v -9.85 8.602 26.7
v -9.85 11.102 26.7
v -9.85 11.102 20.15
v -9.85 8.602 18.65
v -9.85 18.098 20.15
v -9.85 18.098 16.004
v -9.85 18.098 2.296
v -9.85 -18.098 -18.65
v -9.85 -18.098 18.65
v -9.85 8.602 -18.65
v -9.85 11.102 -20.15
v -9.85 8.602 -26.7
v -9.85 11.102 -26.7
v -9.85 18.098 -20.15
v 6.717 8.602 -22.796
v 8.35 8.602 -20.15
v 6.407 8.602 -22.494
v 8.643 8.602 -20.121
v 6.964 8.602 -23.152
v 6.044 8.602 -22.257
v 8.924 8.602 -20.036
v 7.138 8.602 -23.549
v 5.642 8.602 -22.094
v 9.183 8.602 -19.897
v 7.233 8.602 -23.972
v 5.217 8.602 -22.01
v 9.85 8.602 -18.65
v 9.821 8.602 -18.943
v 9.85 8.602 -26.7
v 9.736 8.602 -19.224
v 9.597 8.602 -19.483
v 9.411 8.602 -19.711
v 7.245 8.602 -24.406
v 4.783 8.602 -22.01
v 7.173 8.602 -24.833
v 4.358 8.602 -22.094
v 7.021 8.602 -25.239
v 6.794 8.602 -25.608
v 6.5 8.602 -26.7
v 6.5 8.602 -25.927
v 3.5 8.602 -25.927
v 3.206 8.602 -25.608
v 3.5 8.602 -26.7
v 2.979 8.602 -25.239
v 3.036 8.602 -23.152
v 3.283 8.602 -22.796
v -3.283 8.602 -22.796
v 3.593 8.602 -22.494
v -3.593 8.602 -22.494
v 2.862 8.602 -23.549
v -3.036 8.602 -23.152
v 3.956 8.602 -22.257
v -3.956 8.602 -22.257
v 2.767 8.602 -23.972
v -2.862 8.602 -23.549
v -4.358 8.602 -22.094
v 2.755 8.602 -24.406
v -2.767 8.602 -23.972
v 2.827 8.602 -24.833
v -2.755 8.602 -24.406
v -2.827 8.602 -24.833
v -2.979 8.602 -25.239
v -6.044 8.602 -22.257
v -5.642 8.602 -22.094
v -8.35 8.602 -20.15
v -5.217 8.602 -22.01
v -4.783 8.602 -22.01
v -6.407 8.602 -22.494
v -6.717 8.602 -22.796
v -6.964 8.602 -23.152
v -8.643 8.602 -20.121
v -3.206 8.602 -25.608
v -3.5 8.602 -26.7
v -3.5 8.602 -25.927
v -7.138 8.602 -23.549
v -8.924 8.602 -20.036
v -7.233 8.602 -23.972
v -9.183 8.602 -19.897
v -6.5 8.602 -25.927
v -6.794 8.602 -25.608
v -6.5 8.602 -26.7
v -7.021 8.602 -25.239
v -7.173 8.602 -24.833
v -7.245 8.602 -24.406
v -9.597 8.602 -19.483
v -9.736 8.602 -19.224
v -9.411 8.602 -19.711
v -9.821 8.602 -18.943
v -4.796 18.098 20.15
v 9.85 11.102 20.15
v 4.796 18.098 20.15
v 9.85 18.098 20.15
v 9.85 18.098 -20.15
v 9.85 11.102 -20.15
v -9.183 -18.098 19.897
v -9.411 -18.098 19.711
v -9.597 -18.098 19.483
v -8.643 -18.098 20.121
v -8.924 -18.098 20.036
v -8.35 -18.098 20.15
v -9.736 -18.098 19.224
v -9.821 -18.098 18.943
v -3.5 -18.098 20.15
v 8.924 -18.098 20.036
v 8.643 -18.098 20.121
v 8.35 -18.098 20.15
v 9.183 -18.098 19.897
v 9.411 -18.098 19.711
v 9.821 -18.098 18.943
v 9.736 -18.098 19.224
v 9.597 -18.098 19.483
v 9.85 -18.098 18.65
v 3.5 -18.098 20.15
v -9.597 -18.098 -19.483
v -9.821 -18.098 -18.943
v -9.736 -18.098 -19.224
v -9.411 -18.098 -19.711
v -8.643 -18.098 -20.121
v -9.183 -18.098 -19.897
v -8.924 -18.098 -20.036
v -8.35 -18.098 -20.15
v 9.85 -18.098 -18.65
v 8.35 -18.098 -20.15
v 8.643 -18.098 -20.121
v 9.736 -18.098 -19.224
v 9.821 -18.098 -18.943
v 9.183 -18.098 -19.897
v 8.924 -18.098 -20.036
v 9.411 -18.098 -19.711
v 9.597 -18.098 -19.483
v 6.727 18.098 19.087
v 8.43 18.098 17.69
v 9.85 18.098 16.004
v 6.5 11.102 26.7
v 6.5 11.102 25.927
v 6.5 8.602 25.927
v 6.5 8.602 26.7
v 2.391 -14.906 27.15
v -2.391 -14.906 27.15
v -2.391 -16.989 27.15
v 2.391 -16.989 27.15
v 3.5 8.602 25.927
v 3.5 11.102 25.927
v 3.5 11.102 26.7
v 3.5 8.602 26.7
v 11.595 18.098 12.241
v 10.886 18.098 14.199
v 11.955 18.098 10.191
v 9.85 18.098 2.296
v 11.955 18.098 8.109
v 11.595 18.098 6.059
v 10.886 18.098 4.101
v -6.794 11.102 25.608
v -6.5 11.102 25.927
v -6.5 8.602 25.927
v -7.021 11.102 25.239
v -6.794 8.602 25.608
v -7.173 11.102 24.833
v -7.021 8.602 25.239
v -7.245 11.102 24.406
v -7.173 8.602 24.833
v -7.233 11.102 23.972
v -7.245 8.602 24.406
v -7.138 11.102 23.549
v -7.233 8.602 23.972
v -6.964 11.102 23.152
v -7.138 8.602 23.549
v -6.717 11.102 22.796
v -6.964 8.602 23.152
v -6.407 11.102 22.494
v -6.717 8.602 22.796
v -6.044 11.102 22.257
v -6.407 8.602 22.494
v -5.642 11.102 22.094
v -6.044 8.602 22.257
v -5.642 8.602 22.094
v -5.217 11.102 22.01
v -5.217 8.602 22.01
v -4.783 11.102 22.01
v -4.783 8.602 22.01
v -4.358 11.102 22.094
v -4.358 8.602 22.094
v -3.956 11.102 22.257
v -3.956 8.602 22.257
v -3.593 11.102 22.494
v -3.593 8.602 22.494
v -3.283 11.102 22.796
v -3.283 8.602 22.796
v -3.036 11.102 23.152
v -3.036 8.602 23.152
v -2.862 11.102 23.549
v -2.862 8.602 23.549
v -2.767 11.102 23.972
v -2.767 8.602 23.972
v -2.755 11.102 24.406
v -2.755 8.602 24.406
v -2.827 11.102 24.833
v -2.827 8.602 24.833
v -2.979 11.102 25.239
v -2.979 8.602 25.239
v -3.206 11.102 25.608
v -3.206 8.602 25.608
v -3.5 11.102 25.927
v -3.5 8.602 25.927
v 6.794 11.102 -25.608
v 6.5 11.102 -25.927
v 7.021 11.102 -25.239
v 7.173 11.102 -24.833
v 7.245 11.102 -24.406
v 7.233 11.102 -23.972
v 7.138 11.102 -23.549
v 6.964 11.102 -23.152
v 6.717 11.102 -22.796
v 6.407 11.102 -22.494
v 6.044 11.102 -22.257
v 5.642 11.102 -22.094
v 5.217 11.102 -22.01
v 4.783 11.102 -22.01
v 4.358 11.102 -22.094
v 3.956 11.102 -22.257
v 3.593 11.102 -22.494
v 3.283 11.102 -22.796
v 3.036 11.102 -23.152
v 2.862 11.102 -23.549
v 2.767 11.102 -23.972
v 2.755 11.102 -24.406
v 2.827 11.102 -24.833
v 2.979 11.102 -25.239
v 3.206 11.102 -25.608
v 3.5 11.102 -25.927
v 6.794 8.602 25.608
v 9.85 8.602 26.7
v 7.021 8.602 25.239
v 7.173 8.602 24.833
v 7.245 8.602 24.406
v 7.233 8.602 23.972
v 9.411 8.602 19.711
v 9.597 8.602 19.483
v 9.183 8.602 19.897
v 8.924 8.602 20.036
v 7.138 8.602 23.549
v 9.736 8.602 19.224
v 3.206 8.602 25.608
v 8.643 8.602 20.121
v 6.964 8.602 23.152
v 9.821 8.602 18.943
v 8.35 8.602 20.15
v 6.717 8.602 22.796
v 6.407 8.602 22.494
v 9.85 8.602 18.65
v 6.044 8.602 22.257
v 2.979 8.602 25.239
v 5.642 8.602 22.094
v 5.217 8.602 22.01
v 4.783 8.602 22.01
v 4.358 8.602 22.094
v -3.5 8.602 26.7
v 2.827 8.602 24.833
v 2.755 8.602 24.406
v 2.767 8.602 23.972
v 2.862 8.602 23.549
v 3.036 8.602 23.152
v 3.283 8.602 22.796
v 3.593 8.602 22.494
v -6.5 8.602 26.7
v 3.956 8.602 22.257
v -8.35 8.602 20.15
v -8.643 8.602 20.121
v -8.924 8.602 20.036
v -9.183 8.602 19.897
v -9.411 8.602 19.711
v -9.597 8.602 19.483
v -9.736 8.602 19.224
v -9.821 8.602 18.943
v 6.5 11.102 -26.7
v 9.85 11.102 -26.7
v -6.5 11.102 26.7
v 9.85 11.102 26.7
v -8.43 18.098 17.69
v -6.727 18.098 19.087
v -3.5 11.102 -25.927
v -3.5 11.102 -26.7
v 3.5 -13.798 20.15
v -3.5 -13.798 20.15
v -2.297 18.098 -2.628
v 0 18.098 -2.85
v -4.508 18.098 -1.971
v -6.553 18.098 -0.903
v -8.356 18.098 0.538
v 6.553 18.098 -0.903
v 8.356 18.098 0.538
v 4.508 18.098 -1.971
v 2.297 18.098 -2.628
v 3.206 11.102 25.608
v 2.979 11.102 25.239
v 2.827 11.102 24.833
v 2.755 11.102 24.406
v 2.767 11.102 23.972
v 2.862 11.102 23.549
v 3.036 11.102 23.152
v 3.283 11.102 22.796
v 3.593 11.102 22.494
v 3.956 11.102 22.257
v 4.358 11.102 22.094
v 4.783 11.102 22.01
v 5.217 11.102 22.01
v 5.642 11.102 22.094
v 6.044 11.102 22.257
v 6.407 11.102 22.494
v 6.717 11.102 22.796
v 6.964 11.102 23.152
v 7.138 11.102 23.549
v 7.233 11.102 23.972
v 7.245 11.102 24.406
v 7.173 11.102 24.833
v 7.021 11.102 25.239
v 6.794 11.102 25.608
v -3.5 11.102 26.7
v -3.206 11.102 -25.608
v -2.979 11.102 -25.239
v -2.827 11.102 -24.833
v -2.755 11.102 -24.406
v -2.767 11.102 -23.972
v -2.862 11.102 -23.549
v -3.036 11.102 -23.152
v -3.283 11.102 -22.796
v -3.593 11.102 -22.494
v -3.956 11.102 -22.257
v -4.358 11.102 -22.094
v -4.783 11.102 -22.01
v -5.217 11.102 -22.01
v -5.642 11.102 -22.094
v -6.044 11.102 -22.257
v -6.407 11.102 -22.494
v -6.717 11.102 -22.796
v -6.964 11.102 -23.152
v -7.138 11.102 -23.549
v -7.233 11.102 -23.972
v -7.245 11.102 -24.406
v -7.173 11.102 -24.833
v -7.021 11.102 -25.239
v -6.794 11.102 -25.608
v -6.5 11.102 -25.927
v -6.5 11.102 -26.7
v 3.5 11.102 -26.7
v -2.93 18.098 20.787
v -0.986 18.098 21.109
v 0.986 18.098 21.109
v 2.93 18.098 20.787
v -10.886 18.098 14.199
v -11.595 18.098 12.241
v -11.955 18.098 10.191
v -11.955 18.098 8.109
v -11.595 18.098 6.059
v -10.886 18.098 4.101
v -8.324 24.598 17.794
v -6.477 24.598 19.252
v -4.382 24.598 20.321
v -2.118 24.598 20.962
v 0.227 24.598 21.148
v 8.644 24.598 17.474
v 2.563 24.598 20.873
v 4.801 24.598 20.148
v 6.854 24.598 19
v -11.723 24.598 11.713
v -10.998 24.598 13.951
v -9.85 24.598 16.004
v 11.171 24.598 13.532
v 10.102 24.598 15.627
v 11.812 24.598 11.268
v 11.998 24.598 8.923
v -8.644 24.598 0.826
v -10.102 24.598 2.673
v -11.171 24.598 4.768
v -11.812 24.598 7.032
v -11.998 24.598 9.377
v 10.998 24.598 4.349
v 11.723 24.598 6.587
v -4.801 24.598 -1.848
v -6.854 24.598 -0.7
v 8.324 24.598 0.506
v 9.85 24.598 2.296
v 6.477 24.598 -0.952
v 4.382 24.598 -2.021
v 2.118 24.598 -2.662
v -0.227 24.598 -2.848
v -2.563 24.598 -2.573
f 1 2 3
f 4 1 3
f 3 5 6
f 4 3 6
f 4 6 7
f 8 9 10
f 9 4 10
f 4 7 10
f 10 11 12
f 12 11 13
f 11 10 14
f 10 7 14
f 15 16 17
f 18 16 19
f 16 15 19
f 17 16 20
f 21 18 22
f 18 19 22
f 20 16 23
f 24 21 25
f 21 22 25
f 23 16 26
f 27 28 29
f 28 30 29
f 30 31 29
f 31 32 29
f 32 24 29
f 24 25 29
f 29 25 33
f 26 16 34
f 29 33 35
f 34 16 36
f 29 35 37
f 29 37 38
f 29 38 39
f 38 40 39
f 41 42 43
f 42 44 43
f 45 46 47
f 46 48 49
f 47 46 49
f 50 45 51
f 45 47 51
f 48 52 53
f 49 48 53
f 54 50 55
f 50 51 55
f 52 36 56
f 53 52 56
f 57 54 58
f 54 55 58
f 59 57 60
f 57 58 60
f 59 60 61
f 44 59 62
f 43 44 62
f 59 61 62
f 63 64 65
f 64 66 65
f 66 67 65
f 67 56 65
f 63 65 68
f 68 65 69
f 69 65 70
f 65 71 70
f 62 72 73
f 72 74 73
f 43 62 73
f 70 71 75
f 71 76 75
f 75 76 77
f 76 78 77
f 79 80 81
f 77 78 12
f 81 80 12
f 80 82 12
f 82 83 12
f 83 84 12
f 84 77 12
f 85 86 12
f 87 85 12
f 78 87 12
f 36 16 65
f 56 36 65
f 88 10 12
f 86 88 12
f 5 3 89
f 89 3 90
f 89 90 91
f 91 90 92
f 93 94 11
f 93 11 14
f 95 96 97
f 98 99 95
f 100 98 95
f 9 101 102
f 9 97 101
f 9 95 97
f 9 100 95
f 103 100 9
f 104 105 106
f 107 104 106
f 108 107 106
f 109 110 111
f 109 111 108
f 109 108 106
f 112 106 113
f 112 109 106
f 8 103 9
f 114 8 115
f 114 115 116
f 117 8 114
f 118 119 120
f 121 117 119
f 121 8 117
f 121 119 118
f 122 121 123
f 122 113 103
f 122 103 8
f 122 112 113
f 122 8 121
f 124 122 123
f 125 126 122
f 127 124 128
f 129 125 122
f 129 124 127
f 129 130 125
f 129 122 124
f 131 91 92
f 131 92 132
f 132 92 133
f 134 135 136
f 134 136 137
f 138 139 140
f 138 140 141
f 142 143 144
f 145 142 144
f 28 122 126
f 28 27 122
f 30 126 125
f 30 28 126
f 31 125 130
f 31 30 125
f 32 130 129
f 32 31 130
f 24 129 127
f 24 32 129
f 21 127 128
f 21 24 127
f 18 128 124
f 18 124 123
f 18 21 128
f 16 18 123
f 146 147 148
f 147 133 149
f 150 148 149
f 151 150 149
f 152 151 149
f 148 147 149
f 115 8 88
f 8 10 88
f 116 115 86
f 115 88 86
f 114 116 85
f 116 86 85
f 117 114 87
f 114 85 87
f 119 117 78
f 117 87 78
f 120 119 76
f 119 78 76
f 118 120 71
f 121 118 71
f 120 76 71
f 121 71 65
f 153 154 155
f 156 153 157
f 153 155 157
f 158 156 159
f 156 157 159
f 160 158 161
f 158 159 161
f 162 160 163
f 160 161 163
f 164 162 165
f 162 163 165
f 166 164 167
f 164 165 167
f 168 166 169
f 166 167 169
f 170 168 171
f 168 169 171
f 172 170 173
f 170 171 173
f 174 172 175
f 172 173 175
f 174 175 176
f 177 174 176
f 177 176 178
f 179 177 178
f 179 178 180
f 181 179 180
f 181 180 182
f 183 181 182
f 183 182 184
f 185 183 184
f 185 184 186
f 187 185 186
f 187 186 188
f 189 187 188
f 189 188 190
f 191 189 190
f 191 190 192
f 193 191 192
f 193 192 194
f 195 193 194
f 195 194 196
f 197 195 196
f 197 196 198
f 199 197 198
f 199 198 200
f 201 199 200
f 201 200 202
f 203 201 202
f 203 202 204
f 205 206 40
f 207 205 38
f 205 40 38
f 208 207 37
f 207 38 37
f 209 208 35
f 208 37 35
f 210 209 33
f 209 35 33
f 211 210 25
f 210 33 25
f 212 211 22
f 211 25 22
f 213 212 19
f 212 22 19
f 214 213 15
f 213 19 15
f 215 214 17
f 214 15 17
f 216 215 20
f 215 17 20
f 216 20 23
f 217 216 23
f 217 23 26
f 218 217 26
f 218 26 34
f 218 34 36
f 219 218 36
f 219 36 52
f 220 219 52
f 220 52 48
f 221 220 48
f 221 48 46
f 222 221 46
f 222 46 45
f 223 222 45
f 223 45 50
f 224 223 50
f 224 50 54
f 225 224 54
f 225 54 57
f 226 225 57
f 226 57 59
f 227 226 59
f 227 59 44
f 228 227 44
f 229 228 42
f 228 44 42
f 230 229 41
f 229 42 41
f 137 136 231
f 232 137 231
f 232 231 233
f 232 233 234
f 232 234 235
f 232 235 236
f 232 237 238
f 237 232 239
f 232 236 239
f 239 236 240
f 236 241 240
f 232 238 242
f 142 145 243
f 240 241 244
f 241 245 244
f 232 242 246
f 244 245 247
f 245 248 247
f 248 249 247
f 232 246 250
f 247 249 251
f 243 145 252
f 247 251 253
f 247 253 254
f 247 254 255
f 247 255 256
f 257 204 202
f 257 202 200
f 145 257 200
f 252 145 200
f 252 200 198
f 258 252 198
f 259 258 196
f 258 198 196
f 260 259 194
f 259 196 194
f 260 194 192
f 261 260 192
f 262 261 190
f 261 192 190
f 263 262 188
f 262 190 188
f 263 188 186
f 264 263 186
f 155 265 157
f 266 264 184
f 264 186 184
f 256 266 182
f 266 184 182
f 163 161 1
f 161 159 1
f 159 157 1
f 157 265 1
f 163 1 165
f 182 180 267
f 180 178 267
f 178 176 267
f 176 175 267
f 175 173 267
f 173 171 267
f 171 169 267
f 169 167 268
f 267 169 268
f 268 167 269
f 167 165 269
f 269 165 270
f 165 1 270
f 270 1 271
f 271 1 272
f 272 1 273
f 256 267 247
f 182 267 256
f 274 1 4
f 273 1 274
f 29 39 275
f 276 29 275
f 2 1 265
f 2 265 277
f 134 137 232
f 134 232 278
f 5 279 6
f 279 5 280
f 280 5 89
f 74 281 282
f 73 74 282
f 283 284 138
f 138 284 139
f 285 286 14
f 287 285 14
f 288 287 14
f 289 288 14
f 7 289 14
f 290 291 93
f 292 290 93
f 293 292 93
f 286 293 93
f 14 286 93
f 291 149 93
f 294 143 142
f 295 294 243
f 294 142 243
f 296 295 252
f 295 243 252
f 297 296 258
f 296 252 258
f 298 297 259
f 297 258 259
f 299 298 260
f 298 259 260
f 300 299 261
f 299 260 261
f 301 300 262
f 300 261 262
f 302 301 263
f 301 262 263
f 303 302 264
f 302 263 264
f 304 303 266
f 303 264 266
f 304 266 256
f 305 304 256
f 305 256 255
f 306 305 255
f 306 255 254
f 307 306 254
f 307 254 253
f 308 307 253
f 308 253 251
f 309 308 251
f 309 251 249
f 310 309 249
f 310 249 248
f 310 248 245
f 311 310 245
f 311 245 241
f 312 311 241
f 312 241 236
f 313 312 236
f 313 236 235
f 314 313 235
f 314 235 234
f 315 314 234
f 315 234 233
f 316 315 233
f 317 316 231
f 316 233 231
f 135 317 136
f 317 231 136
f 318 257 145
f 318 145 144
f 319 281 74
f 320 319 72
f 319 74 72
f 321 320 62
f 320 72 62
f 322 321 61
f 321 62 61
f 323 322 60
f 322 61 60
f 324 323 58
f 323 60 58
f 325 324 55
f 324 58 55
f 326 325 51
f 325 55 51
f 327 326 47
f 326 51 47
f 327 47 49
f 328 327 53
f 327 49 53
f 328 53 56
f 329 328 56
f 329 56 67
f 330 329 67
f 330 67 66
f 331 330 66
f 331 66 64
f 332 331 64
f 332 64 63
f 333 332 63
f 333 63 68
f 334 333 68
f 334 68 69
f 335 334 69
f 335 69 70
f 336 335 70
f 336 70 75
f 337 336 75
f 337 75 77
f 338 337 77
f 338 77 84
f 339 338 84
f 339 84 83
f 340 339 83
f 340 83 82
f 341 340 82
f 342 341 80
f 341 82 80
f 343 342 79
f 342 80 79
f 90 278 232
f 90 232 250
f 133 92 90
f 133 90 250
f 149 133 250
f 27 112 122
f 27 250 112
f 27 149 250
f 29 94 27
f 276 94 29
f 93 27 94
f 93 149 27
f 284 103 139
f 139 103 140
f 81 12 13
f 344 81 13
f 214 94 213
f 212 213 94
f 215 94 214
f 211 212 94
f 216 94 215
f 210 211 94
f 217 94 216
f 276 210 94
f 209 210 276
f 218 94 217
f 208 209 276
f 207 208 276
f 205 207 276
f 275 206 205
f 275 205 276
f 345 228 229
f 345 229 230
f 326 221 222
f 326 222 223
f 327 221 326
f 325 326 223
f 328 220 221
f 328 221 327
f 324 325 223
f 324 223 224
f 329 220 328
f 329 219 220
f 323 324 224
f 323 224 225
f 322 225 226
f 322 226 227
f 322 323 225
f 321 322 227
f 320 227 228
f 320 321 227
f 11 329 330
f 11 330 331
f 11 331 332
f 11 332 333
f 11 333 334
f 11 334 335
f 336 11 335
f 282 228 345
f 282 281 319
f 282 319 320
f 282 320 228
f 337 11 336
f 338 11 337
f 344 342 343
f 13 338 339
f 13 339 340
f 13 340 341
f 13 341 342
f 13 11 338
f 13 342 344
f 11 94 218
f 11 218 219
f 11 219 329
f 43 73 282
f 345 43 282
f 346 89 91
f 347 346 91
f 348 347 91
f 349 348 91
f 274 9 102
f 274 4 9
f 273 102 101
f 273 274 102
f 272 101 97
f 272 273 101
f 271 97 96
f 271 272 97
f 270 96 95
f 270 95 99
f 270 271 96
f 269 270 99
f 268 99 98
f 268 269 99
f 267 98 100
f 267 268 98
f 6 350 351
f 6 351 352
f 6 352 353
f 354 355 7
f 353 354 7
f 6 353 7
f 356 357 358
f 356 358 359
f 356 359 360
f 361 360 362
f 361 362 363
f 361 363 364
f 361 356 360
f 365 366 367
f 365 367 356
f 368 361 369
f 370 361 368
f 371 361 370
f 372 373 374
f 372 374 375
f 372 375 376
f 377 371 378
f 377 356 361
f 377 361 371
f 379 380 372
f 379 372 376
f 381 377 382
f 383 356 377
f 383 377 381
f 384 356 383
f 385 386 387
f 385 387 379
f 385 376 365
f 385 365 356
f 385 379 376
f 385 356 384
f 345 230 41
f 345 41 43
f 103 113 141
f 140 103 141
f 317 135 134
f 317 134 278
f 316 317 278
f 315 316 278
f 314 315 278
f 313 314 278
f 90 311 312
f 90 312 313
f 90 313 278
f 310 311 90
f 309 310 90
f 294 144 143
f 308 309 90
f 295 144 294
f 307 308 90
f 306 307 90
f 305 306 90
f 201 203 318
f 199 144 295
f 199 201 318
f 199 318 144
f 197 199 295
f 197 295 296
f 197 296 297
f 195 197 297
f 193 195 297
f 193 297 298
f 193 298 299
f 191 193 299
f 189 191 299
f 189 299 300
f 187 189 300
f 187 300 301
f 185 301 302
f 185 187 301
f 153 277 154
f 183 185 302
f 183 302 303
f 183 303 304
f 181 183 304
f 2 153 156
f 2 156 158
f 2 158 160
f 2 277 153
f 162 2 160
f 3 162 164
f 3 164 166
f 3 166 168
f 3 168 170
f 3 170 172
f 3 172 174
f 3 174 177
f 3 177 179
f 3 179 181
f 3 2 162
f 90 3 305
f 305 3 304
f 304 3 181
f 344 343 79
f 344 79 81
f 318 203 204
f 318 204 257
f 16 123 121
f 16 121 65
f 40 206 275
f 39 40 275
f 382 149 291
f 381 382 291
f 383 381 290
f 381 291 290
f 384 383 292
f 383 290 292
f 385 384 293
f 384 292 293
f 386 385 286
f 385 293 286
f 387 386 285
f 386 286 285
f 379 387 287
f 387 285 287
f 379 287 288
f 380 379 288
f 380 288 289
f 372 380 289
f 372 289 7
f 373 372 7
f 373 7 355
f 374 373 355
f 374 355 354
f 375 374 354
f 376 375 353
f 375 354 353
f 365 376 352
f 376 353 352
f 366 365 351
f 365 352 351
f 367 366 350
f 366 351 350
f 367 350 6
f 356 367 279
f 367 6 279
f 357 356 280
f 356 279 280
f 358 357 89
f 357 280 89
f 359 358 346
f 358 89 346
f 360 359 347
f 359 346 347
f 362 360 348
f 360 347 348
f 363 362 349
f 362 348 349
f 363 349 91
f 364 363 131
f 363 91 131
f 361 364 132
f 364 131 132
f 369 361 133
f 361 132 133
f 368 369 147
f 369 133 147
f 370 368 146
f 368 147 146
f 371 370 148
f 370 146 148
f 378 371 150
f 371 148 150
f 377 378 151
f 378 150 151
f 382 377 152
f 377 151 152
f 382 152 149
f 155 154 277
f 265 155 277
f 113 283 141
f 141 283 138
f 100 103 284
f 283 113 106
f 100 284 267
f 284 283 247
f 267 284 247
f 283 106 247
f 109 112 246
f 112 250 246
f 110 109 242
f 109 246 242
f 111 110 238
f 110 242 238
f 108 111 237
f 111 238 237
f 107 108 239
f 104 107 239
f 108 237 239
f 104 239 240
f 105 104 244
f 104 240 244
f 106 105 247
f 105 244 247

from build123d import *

# Parameters (mm, degrees)
ESQUISSE1_W                         = 40.3
ESQUISSE1_H                         = 36.195
BOSS_EXTRU_1_DEPTH                  = 9.85
ESQUISSE2_W                         = 53.4
ESQUISSE2_H                         = 2.5
BOSS_EXTRU_2_DEPTH                  = 19.7
ESQUISSE3_R                         = 12
BOSS_EXTRU_3_DEPTH                  = 6.5
ESQUISSE5_W                         = 7
ESQUISSE5_H                         = 4.3
BOSS_EXTRU_4_DEPTH                  = 7
BOSS_EXTRU_4_TAPER                  = 9
DIAM_TRE_DU_PER_AGE_4_5_4_5_1_D     = 4.5
DIAM_TRE_DU_PER_AGE_4_5_4_5_1_DEPTH = 3.2
DIAM_TRE_DU_PER_AGE_4_5_4_5_1_TIP   = 1.351936393
ESQUISSE9_W                         = 3
ESQUISSE9_H                         = 0.772949017
ENL_V_MAT_EXTRU_1_DEPTH             = 42.638473795
SYM_TRIE2_COPY_1_SKETCH_W           = 3
SYM_TRIE2_COPY_1_SKETCH_H           = 0.772949017
SYM_TRIE2_COPY_1_DEPTH              = 42.638473795
CONG_1_R                            = 1.5


with BuildPart() as part:
    # Esquisse1 → Boss.-Extru.1 (new, symmetric)
    with BuildSketch(Plane(origin=(0, 0, 0), x_dir=(0, 0, -1), z_dir=(1, 0, 0))):
        Rectangle(ESQUISSE1_W, ESQUISSE1_H)
    extrude(amount=BOSS_EXTRU_1_DEPTH, both=True)

    # Esquisse2 → Boss.-Extru.2 (add)
    with BuildSketch(Plane(origin=(-9.85, 0, 0), x_dir=(0, 0, -1), z_dir=(1, 0, 0))):
        with Locations((0, 9.8525)):
            Rectangle(ESQUISSE2_W, ESQUISSE2_H)
    extrude(amount=BOSS_EXTRU_2_DEPTH)

    # Esquisse3 → Boss.-Extru.3 (add)
    with BuildSketch(Plane(origin=(0, 18.0975, 0), x_dir=(1, 0, 0), z_dir=(0, 1, 0))):
        with Locations(Location((0, -9.15, 0), (0, 0, 34.831699177))):
            Circle(ESQUISSE3_R)
    extrude(amount=BOSS_EXTRU_3_DEPTH)

    # Esquisse5 → Boss.-Extru.4 (add)
    with BuildSketch(Plane.XY.offset(20.15)):
        with Locations((0, -15.9475)):
            Rectangle(ESQUISSE5_W, ESQUISSE5_H)
    extrude(amount=BOSS_EXTRU_4_DEPTH, taper=BOSS_EXTRU_4_TAPER)

    # Diamètre du perçage Ø4.5 (4.5)1
    with Locations(Plane(origin=(0, 11.1025, 0), x_dir=(1, 0, 0), z_dir=(0, 1, 0))):
        with Locations((5, 24.25), (-5, 24.25), (5, -24.25), (-5, -24.25)):
            Hole(DIAM_TRE_DU_PER_AGE_4_5_4_5_1_D / 2, depth=DIAM_TRE_DU_PER_AGE_4_5_4_5_1_DEPTH)
            with Locations((0, 0, -(DIAM_TRE_DU_PER_AGE_4_5_4_5_1_DEPTH + DIAM_TRE_DU_PER_AGE_4_5_4_5_1_TIP / 2))):  # 118° drill point
                Cone(0, DIAM_TRE_DU_PER_AGE_4_5_4_5_1_D / 2, DIAM_TRE_DU_PER_AGE_4_5_4_5_1_TIP, mode=Mode.SUBTRACT)

    # Esquisse9 → Enlèv. mat.-Extru.1 (cut, through all)
    with BuildSketch(Plane(origin=(0, 11.1025, 0), x_dir=(1, 0, 0), z_dir=(0, 1, 0))):
        with Locations((-5, 26.313525492)):
            Rectangle(ESQUISSE9_W, ESQUISSE9_H)
    enl_v_mat_extru_1 = extrude(amount=-ENL_V_MAT_EXTRU_1_DEPTH, mode=Mode.SUBTRACT)

    # Symétrie1: Enlèv. mat.-Extru.1 across plane
    add(enl_v_mat_extru_1.mirror(Plane(origin=(0, 0, 0), x_dir=(0, 0, 1), z_dir=(1, 0, 0))), mode=Mode.SUBTRACT)

    # Symétrie2: Enlèv. mat.-Extru.1 across plane
    add(enl_v_mat_extru_1.mirror(Plane.XY), mode=Mode.SUBTRACT)

    # Symétrie2 copy 1 sketch → Symétrie2 copy 1 (cut, through all)
    with BuildSketch(Plane(origin=(0, 11.1025, 0), x_dir=(-1, 0, 0), z_dir=(0, 1, 0))):
        with Locations((-5, 26.313525492)):
            Rectangle(SYM_TRIE2_COPY_1_SKETCH_W, SYM_TRIE2_COPY_1_SKETCH_H)
    extrude(amount=-SYM_TRIE2_COPY_1_DEPTH, mode=Mode.SUBTRACT)

    # Congé1
    cong_1_edges = [part.edges().sort_by_distance(p)[0] for p in [
        (-9.85, -4.7475, 20.15),
        (9.85, -4.7475, 20.15),
        (9.85, -4.7475, -20.15),
        (-9.85, -4.7475, -20.15),
    ]]
    fillet(cong_1_edges, radius=CONG_1_R)


solid = part.part
